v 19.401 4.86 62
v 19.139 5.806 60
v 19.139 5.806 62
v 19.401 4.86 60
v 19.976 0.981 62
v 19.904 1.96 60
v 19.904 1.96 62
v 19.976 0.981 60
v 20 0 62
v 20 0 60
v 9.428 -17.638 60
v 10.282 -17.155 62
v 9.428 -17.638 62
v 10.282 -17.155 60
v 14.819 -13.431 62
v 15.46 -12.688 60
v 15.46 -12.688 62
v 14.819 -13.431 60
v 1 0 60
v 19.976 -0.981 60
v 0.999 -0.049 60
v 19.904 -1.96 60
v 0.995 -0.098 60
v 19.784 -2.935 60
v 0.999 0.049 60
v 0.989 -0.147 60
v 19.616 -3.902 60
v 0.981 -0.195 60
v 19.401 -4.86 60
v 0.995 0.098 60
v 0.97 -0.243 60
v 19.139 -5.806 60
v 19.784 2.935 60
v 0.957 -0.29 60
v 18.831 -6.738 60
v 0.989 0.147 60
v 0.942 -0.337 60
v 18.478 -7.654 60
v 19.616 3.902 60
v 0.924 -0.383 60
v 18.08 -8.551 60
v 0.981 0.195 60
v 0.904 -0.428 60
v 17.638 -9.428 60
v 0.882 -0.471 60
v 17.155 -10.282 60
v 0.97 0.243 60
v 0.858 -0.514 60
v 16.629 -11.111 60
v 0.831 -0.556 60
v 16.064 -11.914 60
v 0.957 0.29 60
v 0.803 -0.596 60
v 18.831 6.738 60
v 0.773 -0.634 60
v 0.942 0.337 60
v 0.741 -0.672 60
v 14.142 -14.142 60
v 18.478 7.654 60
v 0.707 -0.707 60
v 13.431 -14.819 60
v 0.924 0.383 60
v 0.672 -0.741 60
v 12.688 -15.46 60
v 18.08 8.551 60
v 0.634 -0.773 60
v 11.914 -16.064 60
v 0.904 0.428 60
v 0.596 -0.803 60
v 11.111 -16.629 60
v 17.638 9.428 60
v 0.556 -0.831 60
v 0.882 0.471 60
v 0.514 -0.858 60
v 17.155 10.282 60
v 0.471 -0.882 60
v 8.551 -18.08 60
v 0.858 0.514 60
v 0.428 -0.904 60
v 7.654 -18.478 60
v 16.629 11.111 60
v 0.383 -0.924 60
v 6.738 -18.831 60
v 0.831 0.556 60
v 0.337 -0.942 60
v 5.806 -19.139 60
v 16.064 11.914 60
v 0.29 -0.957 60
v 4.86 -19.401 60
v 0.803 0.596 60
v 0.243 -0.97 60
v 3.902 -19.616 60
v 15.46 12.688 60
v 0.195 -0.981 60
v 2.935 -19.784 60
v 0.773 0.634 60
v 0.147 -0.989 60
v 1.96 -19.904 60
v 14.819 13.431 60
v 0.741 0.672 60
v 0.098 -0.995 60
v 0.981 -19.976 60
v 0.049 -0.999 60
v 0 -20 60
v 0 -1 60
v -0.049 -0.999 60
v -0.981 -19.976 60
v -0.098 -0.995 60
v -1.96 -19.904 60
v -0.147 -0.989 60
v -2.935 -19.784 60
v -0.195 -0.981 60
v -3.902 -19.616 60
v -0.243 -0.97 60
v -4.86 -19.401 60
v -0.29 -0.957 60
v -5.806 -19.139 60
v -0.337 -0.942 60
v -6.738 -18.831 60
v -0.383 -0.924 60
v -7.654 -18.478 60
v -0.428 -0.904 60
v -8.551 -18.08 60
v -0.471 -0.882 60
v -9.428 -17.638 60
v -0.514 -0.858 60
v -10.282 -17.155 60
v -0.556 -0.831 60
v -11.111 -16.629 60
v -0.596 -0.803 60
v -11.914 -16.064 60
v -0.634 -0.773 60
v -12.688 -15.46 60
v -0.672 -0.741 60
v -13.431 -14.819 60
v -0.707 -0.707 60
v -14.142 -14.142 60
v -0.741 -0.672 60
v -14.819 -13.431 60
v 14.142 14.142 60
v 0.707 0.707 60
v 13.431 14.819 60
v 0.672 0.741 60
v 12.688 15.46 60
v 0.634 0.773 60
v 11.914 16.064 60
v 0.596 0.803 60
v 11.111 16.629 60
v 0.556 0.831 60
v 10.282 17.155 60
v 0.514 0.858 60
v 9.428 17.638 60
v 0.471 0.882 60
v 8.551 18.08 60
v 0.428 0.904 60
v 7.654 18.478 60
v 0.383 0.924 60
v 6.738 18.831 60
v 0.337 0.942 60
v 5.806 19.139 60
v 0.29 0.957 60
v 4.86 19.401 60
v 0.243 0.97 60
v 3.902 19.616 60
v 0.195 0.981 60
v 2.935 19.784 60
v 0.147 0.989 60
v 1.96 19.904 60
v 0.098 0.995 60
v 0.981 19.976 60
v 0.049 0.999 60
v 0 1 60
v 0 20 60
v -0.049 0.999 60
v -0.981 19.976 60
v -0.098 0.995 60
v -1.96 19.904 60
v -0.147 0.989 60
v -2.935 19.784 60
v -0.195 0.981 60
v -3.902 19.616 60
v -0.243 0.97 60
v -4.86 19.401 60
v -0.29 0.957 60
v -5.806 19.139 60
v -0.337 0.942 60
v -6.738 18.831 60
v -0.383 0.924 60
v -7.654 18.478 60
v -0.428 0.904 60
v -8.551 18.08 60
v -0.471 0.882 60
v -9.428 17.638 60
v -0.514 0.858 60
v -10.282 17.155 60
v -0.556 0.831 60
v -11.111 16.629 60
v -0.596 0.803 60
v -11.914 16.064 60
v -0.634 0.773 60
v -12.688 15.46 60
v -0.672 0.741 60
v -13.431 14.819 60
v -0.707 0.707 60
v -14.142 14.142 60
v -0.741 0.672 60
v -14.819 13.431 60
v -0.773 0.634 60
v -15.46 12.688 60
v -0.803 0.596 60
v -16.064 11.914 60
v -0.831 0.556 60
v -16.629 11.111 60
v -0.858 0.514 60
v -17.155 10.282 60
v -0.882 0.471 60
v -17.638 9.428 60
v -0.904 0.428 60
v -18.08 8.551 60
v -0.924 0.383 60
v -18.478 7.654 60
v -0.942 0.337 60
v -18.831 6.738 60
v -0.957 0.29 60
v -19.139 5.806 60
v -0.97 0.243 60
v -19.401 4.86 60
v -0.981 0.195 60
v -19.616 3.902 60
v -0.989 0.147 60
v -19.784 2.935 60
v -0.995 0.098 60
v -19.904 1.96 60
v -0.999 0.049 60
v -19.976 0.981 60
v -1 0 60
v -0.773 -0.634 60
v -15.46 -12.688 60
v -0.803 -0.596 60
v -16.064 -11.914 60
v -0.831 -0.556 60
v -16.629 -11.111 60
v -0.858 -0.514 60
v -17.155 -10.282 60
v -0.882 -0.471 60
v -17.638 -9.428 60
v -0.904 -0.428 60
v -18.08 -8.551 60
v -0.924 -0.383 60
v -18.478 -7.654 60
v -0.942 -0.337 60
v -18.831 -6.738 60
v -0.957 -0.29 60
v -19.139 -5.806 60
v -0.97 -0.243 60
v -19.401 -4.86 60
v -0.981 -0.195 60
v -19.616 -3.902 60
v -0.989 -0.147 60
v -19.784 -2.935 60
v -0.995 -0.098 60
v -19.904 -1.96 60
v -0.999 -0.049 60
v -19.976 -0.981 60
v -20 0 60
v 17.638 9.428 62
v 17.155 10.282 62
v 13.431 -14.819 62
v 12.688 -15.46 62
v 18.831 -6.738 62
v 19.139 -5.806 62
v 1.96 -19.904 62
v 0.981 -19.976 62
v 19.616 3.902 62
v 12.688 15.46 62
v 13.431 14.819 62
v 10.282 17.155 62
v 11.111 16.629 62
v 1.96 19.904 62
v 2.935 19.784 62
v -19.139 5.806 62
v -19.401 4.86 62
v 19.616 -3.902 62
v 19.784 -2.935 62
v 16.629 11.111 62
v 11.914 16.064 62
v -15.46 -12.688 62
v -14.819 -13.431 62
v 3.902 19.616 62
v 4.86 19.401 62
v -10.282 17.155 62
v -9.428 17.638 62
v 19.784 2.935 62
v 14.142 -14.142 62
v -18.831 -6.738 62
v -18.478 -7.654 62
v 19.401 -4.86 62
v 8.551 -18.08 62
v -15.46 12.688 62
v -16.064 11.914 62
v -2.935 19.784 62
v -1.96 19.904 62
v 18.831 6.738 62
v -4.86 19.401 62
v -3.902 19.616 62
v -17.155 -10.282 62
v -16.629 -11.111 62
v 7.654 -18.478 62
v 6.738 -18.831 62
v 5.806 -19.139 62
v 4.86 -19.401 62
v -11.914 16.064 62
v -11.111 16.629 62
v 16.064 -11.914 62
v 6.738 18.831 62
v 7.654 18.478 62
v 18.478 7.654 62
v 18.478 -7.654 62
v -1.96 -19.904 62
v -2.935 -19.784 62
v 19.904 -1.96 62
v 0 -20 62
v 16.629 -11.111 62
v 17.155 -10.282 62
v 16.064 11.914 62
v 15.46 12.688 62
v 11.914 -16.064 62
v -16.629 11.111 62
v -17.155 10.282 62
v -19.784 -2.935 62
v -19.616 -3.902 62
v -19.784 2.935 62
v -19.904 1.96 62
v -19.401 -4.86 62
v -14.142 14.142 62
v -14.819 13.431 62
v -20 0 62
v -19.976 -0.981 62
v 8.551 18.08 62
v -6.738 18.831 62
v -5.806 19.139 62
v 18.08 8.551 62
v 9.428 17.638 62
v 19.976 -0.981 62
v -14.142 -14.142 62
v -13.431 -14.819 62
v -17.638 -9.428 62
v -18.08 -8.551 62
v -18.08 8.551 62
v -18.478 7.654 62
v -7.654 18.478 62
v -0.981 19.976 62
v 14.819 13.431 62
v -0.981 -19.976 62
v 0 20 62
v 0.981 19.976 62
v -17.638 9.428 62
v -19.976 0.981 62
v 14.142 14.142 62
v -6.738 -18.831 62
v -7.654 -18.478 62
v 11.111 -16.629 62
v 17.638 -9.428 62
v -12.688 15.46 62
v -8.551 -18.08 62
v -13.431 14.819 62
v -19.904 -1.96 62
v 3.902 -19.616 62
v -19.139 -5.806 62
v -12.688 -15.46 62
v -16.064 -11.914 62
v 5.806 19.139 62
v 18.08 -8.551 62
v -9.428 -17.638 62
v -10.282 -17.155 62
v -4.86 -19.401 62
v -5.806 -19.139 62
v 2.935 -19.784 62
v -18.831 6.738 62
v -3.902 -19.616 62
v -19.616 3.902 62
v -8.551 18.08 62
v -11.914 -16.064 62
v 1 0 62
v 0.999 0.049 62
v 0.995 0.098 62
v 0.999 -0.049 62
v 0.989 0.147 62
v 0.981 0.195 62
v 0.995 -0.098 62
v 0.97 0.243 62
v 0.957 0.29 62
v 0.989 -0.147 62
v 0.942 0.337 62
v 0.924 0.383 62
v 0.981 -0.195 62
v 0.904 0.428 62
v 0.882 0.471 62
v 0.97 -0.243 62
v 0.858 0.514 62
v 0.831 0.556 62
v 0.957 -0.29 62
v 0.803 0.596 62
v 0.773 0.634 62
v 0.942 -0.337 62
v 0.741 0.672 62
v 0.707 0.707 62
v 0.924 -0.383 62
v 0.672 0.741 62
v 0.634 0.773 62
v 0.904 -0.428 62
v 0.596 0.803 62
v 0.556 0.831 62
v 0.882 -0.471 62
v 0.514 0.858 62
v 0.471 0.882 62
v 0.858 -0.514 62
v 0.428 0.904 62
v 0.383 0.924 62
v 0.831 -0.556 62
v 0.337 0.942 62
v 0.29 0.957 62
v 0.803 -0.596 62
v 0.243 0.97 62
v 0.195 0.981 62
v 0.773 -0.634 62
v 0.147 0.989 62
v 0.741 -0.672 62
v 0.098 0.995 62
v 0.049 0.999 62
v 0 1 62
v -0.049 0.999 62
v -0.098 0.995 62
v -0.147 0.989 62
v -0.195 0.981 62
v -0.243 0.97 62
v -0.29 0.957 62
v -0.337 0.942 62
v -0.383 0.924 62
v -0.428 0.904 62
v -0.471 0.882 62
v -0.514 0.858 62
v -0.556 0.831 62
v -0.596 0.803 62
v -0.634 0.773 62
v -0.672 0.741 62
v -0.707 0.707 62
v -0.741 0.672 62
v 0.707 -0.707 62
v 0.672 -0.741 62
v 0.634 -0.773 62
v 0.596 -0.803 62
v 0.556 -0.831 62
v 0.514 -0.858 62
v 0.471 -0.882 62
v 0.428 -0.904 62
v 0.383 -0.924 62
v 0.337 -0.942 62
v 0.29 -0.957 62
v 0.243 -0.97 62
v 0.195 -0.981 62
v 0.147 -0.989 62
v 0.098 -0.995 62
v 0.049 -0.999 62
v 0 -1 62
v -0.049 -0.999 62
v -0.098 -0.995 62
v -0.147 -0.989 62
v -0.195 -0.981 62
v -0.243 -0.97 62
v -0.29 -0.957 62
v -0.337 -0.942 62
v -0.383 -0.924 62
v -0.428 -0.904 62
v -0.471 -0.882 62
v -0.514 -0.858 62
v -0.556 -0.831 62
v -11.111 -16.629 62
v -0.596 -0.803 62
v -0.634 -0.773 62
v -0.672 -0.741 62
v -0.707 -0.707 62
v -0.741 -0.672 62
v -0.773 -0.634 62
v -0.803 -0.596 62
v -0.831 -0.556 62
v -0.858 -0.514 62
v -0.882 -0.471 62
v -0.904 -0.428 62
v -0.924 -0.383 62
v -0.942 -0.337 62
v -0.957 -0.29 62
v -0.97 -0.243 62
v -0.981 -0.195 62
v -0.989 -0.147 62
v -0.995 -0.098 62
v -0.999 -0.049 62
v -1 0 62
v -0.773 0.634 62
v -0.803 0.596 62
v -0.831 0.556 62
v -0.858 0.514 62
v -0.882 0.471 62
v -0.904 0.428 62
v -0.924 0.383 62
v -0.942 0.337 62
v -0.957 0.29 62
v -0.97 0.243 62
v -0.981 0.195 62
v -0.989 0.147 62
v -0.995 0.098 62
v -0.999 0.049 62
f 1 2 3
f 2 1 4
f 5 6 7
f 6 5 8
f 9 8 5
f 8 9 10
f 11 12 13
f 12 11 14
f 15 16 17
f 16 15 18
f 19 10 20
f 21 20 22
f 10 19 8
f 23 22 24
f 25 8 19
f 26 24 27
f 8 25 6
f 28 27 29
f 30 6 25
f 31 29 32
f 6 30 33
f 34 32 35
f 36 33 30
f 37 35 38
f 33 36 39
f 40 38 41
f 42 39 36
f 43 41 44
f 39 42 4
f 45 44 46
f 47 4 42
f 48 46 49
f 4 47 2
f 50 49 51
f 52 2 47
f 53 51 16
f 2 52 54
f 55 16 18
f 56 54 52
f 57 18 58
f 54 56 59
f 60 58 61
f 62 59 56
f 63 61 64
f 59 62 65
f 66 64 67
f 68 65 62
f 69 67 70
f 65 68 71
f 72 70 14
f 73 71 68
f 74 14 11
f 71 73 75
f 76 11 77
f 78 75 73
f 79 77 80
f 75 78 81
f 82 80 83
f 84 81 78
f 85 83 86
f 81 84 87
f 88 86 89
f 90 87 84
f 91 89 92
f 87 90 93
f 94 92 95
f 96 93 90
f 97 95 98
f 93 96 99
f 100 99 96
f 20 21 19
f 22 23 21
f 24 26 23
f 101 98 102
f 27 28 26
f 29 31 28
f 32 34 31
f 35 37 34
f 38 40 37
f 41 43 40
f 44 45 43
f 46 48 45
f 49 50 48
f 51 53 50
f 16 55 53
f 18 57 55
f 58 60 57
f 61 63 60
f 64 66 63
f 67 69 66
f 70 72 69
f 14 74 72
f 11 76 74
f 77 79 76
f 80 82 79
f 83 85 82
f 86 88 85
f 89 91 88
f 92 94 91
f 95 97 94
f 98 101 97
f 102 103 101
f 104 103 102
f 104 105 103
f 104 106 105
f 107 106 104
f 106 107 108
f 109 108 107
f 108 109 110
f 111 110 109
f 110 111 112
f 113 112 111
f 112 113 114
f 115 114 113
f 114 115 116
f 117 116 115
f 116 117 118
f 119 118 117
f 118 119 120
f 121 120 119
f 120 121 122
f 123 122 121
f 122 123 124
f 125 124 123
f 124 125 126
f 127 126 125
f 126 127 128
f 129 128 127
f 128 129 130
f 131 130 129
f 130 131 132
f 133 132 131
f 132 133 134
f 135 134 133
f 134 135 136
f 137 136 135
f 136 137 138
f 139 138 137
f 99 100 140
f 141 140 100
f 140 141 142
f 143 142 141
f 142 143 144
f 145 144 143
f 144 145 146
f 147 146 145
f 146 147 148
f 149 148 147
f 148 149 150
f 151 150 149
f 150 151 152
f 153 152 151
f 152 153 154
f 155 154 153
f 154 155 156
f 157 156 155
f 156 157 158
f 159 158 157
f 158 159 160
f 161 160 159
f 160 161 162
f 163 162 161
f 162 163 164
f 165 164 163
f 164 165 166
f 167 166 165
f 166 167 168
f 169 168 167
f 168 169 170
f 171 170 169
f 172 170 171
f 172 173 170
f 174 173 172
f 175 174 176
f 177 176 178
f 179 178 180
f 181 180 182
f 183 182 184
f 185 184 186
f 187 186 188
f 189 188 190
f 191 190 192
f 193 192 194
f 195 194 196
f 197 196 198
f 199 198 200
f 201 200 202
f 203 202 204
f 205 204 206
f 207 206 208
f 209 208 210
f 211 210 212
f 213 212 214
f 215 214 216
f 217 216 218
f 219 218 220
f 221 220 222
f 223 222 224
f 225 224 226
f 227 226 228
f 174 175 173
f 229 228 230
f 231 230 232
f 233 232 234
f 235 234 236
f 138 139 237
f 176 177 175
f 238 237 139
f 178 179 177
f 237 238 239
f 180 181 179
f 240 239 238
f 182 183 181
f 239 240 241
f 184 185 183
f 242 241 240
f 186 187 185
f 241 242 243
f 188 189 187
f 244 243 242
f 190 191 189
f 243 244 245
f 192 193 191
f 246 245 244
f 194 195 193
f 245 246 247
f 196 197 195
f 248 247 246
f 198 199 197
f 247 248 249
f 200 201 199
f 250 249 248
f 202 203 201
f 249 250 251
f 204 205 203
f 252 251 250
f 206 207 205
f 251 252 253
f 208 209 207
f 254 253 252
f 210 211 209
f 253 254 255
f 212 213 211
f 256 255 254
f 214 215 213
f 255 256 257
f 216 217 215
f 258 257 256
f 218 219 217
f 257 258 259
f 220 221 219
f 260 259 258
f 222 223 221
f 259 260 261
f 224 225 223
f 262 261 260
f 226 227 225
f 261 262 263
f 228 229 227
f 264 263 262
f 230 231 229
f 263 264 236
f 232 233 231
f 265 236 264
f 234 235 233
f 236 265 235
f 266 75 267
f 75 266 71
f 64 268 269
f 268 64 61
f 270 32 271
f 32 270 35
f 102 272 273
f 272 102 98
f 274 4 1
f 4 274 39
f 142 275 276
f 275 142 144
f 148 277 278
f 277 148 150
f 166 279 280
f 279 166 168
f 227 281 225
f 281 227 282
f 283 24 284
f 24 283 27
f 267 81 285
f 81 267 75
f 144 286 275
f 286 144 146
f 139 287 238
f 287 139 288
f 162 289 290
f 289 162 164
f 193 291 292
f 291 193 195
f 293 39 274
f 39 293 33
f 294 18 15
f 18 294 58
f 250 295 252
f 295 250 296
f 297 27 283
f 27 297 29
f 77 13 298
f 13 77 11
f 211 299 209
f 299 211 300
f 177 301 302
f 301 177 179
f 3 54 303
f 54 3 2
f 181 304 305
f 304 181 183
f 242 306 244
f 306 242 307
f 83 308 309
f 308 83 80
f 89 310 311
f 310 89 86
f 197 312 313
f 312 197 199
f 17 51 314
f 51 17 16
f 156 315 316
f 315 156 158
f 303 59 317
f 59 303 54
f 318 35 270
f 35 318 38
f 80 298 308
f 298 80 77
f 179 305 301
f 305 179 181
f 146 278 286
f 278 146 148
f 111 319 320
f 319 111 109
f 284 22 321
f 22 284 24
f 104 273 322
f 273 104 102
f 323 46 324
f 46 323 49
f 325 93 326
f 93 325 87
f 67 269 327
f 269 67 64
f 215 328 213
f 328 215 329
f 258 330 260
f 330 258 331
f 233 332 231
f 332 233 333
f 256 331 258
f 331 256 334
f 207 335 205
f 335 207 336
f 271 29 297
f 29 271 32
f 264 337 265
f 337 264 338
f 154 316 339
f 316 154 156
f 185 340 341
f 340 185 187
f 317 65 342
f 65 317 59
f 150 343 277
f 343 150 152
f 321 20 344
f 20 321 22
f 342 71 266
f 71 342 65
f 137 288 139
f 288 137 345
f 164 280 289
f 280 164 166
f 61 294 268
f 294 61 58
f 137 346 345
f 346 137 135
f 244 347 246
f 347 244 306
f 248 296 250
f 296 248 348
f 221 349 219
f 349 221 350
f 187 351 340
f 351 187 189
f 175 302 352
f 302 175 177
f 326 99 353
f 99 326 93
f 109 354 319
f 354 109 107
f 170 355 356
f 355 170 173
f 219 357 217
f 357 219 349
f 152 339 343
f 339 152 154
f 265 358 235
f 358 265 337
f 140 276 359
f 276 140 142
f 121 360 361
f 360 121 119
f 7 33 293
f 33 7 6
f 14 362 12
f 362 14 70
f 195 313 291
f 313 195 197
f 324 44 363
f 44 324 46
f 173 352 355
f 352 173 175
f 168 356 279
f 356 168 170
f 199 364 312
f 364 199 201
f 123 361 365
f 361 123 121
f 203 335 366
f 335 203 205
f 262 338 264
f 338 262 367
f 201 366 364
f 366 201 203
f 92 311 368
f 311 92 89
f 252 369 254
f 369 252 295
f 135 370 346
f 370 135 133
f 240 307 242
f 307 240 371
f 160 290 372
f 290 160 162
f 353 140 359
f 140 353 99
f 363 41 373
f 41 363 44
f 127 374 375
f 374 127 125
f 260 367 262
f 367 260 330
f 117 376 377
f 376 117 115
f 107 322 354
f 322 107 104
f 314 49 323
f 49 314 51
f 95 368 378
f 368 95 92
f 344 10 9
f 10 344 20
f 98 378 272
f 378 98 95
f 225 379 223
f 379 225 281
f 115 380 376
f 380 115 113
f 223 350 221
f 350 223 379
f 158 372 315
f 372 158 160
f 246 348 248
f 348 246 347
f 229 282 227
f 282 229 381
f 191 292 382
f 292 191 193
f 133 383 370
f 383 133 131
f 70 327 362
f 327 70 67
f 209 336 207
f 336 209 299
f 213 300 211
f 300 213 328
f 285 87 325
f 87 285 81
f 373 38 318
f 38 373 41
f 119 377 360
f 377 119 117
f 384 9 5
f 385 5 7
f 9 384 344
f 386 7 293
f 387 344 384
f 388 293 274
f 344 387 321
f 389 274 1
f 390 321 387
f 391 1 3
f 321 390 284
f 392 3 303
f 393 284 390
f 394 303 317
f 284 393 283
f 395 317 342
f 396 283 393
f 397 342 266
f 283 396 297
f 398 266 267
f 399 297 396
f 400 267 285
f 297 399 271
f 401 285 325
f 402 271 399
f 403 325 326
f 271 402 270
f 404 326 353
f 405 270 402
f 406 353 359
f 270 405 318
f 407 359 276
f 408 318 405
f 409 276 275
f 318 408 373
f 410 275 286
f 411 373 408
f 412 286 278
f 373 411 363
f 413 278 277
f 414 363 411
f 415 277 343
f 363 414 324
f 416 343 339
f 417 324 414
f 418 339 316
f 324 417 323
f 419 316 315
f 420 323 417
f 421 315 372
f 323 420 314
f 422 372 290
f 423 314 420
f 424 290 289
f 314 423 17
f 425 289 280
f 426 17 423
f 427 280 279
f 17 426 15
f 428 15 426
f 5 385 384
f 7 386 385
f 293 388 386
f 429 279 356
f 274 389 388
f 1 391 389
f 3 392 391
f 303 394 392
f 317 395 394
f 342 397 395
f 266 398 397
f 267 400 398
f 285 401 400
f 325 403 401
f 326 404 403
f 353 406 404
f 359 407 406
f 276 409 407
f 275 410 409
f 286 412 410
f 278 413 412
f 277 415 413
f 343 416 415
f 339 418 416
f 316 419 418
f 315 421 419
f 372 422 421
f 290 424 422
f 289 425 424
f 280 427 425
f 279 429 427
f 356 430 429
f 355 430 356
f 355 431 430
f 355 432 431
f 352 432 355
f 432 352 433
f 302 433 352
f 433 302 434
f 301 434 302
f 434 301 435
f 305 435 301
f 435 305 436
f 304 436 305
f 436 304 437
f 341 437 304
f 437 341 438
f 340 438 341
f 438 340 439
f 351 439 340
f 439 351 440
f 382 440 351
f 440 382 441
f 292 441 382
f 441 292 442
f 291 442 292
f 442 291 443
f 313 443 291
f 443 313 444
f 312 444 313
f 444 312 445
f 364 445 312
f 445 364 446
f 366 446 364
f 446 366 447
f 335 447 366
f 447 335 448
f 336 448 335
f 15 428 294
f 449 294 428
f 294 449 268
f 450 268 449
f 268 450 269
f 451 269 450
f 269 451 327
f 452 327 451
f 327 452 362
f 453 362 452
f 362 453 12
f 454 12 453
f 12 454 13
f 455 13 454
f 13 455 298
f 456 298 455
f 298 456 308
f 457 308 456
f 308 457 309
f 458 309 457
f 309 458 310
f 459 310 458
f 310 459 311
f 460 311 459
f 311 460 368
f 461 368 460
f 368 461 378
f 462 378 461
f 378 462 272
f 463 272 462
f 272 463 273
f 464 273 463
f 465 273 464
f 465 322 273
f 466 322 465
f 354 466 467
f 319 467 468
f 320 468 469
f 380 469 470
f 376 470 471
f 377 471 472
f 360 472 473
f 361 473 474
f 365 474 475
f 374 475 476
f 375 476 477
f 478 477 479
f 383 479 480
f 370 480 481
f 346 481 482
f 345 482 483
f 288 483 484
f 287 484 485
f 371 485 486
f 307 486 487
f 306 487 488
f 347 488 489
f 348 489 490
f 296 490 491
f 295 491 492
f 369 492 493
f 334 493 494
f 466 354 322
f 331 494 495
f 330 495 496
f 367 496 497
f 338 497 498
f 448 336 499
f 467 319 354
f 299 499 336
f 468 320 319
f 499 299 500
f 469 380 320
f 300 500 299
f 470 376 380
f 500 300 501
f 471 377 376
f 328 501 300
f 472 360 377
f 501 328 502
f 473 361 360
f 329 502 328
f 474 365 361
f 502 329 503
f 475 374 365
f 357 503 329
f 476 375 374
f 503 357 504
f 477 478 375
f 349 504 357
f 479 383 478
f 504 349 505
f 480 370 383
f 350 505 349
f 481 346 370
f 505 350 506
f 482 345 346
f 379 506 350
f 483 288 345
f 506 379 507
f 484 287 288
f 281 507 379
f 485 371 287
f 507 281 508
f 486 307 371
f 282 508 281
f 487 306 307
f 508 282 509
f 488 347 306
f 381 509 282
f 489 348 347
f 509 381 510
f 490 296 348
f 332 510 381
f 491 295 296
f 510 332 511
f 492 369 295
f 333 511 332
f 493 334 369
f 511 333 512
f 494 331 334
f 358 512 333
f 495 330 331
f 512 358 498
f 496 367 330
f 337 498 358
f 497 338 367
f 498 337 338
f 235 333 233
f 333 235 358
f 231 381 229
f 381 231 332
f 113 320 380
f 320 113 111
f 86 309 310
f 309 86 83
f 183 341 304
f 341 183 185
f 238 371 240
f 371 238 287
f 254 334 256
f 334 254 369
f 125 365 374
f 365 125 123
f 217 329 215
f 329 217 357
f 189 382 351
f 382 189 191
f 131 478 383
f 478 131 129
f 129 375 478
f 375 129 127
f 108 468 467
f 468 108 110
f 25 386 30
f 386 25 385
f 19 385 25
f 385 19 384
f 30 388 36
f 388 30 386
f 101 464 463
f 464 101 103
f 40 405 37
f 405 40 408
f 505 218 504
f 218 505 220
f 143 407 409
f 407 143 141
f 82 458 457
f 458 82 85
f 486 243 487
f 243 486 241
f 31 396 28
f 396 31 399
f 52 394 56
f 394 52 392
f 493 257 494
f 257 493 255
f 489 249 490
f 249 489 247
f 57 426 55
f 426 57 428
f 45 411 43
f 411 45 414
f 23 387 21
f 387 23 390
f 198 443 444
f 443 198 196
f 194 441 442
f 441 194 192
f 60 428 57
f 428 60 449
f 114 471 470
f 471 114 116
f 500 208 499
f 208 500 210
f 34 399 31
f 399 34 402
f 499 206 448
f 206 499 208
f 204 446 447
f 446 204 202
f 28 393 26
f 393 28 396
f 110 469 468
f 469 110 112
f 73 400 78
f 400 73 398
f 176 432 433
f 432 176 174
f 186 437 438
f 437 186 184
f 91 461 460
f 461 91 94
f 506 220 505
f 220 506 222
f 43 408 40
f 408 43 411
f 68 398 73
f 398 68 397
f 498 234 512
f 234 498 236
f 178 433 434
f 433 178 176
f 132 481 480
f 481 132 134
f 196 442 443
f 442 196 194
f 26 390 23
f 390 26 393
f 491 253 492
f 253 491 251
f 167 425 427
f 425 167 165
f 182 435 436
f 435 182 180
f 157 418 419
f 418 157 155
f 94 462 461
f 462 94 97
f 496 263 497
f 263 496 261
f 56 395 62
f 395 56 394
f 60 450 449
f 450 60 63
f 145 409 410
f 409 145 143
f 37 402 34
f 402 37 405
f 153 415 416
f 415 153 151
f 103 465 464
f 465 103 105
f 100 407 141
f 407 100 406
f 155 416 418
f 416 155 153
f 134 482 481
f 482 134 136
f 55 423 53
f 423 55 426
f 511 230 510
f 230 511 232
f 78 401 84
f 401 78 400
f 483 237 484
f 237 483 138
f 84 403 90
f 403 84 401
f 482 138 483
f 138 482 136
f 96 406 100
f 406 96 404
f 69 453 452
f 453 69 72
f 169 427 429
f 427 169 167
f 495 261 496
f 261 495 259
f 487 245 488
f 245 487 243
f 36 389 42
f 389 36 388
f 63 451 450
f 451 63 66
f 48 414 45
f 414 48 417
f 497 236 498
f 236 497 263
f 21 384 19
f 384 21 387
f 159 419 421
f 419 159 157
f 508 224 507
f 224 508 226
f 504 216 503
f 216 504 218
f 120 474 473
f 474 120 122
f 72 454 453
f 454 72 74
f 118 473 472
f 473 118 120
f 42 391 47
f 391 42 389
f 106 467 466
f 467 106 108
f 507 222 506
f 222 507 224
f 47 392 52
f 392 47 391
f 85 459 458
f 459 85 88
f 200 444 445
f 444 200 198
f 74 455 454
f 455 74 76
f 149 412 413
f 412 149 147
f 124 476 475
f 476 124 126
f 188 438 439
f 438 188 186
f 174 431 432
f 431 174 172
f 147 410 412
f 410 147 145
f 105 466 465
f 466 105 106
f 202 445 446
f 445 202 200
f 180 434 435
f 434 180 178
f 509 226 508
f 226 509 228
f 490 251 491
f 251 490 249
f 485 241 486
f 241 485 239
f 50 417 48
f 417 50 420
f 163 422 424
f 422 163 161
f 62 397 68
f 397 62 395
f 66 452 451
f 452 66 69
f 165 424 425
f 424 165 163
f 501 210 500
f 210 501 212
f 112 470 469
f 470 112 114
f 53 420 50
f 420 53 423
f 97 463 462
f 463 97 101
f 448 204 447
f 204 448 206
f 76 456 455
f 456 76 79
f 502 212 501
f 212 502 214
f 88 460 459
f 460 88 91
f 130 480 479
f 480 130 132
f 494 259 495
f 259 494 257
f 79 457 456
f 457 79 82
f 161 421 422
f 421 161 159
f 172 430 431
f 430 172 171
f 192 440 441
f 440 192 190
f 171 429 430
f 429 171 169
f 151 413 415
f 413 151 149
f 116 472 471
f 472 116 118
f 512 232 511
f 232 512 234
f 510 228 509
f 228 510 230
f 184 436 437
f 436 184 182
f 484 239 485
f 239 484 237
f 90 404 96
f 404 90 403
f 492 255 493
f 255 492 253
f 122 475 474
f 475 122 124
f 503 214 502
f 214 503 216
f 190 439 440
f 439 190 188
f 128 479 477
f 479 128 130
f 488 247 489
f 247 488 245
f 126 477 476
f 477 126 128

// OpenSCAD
// file: common_params.scad
cylinder_radius = 20.000000;
cylinder_height = 60.000000;
wall_thickness = 2.000000;

cap_thickness = 2.000000;

rod_radius = 2.000000;
rod_height = 50.000000;

ring_outer_radius = 8.000000;
ring_inner_radius = 4.000000;
ring_thickness = 3.000000;
ring_z = 40.000000;

$fn = 128;
// main file
include <common_params.scad>;

hole_radius = 1.000000;

translate([0, 0, cylinder_height])
difference() {
    cylinder(h = cap_thickness, r = cylinder_radius);
    translate([0, 0, -0.1])
        cylinder(h = cap_thickness + 0.2, r = hole_radius);
}
